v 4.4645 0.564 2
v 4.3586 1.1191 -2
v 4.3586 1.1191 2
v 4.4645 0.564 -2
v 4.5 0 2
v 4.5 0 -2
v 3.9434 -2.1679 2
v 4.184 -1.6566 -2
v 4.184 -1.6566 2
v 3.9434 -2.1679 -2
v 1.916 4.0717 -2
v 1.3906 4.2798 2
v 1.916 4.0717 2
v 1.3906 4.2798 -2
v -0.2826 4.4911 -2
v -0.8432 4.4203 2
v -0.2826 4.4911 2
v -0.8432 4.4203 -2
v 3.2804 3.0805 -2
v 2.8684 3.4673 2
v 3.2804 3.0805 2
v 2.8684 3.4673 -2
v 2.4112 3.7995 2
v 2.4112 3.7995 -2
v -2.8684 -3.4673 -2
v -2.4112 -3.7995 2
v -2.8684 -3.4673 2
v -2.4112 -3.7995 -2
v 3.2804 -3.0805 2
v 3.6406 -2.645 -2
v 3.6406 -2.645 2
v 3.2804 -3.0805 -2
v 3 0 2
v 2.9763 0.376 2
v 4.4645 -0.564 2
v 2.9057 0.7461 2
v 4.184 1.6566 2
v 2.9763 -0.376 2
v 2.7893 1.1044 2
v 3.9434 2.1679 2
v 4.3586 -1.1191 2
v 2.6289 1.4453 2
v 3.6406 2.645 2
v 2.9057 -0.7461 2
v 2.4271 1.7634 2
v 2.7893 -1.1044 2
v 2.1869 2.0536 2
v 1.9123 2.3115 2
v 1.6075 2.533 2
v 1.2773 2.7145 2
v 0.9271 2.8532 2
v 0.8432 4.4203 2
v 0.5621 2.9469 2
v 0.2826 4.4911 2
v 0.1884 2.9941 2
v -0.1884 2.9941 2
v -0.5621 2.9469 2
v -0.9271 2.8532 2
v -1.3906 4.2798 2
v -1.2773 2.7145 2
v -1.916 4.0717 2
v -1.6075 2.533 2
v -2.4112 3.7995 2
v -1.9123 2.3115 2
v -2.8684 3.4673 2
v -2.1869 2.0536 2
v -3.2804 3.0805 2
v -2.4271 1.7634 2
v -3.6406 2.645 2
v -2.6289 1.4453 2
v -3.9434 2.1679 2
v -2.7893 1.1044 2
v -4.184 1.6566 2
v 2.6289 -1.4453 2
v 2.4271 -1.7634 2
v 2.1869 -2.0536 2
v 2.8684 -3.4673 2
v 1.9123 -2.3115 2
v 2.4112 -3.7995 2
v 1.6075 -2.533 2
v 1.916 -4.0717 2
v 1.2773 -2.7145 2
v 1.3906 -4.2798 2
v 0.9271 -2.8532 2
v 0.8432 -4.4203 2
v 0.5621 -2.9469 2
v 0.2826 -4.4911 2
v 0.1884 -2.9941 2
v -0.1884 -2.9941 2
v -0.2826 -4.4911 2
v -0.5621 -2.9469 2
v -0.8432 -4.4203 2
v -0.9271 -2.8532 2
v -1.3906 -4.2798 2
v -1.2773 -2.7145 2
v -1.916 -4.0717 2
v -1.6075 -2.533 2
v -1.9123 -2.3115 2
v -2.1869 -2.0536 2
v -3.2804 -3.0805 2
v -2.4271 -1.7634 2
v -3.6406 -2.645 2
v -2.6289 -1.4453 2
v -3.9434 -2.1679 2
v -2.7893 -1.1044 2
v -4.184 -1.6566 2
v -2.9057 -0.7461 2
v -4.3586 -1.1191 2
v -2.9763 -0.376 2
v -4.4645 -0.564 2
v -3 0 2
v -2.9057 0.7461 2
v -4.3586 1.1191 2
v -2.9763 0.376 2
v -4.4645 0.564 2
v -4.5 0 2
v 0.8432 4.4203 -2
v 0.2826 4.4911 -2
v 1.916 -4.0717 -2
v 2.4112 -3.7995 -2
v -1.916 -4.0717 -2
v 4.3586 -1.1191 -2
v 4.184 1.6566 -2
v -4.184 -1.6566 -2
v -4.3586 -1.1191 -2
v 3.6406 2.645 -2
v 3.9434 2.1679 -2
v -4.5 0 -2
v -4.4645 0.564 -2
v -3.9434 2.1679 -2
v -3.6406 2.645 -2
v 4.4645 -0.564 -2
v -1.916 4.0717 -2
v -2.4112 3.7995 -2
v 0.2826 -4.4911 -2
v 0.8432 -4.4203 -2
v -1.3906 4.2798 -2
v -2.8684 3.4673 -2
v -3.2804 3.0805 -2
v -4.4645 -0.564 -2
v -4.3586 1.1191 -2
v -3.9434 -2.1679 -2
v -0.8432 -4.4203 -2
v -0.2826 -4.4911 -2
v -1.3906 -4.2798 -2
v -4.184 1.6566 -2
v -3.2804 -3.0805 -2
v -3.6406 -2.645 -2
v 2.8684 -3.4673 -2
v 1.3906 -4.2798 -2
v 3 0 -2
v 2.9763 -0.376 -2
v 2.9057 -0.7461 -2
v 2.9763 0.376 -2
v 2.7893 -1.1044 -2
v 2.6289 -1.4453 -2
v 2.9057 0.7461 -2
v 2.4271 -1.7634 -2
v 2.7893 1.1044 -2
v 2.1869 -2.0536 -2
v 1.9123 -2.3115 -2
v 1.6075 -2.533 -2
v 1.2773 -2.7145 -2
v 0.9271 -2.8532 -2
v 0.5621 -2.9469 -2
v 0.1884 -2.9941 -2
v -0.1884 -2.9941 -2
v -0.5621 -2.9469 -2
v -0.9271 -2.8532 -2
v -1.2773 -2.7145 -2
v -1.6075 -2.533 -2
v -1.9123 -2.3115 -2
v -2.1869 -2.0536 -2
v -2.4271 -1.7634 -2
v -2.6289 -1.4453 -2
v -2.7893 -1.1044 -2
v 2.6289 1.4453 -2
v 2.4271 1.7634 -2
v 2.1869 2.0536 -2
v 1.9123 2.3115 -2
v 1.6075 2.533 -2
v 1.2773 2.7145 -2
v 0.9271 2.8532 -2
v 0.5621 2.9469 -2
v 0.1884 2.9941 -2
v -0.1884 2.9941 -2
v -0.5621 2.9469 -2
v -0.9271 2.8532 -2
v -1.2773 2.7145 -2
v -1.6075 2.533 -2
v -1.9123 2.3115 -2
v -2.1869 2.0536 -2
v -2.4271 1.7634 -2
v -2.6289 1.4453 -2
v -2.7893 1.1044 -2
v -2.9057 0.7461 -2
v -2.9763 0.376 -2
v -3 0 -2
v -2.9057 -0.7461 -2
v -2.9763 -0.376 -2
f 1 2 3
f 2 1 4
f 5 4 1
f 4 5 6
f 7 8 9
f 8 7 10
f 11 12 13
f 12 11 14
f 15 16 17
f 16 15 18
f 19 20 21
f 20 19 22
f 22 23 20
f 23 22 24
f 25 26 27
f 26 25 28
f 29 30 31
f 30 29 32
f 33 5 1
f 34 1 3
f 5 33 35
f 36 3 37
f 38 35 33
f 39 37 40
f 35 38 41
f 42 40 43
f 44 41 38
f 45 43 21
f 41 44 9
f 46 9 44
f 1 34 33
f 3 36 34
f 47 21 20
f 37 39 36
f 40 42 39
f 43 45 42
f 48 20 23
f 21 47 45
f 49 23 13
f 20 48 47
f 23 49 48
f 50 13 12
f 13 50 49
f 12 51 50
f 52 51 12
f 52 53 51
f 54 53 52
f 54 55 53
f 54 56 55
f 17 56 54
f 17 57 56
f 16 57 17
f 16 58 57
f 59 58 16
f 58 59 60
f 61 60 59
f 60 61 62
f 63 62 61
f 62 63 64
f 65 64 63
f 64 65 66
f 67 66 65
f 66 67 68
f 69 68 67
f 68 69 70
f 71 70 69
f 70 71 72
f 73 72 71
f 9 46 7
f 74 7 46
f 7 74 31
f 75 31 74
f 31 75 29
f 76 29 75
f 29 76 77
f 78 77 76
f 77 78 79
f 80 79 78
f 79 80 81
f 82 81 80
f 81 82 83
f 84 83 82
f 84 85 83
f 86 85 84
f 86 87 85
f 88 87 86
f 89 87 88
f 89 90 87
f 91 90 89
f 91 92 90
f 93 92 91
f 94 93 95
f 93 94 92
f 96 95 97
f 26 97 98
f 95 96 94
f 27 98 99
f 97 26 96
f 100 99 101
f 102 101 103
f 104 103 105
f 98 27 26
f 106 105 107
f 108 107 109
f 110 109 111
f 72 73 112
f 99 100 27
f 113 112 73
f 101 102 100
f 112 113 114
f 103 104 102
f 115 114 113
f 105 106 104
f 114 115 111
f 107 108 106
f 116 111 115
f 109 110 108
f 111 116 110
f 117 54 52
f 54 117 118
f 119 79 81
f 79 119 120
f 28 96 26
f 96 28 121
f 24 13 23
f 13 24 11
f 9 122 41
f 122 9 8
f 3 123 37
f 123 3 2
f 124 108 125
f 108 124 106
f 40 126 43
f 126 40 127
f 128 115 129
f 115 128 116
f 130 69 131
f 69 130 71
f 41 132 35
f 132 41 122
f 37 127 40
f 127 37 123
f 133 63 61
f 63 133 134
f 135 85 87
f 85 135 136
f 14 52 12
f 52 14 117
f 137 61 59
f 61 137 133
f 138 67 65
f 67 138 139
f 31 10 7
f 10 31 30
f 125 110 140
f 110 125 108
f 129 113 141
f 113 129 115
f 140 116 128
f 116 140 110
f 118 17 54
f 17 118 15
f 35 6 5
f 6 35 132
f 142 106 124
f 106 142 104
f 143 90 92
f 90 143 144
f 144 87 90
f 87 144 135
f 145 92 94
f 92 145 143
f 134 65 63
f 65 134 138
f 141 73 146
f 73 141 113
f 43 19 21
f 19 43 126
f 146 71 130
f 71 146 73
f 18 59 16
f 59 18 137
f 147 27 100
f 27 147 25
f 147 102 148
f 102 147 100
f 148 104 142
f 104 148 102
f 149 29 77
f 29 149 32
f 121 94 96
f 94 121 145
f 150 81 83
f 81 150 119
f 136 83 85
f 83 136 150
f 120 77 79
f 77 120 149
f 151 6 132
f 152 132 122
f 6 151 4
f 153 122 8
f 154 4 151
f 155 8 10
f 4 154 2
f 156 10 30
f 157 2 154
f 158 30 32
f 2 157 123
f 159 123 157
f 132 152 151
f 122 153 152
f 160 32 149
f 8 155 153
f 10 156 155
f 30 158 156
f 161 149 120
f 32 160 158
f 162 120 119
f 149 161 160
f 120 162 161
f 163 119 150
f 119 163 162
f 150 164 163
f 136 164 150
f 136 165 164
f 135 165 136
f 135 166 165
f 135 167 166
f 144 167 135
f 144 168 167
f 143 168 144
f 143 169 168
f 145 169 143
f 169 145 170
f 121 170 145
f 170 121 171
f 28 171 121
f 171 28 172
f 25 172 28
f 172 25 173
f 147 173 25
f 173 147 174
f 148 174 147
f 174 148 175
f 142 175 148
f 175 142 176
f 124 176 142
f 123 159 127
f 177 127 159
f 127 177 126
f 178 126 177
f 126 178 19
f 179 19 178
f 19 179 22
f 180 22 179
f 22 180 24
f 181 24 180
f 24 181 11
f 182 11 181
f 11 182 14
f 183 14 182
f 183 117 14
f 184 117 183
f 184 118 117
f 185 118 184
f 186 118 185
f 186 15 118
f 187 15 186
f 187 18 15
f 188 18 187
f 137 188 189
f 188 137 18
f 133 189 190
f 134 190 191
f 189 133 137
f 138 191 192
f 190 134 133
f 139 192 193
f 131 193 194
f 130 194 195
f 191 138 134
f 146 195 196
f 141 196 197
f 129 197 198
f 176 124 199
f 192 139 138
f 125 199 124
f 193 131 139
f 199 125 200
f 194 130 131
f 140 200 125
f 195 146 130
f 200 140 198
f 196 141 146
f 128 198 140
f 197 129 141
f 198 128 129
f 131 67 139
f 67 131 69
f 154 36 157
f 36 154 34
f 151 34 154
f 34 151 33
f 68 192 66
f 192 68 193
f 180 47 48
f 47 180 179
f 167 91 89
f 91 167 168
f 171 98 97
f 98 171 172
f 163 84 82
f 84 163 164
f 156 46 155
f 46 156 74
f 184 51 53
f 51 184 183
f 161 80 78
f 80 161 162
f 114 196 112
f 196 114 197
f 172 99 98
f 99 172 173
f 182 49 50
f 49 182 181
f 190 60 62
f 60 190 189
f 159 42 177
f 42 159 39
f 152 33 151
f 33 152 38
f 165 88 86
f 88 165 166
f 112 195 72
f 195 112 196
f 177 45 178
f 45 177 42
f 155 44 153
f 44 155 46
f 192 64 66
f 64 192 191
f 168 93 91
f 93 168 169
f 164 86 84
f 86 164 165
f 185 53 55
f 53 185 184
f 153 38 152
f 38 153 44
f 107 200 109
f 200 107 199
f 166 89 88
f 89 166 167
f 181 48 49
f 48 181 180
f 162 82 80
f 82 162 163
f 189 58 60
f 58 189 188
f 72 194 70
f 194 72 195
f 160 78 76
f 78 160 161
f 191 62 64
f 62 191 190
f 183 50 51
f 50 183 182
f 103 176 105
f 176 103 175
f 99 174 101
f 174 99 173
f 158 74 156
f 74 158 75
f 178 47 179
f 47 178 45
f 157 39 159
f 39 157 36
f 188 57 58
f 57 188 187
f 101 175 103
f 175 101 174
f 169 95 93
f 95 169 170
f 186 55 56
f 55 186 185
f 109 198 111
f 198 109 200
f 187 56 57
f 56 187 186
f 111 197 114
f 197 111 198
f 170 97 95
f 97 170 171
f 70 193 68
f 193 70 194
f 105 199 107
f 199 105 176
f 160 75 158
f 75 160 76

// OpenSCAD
$fn = 50;


difference() {
	union() {
		translate(v = [0, 0, -2.0000000000]) {
			cylinder(h = 4, r = 4.5000000000);
		}
	}
	union() {
		translate(v = [0, 0, -100.0000000000]) {
			cylinder(h = 200, r = 3.0000000000);
		}
	}
}
